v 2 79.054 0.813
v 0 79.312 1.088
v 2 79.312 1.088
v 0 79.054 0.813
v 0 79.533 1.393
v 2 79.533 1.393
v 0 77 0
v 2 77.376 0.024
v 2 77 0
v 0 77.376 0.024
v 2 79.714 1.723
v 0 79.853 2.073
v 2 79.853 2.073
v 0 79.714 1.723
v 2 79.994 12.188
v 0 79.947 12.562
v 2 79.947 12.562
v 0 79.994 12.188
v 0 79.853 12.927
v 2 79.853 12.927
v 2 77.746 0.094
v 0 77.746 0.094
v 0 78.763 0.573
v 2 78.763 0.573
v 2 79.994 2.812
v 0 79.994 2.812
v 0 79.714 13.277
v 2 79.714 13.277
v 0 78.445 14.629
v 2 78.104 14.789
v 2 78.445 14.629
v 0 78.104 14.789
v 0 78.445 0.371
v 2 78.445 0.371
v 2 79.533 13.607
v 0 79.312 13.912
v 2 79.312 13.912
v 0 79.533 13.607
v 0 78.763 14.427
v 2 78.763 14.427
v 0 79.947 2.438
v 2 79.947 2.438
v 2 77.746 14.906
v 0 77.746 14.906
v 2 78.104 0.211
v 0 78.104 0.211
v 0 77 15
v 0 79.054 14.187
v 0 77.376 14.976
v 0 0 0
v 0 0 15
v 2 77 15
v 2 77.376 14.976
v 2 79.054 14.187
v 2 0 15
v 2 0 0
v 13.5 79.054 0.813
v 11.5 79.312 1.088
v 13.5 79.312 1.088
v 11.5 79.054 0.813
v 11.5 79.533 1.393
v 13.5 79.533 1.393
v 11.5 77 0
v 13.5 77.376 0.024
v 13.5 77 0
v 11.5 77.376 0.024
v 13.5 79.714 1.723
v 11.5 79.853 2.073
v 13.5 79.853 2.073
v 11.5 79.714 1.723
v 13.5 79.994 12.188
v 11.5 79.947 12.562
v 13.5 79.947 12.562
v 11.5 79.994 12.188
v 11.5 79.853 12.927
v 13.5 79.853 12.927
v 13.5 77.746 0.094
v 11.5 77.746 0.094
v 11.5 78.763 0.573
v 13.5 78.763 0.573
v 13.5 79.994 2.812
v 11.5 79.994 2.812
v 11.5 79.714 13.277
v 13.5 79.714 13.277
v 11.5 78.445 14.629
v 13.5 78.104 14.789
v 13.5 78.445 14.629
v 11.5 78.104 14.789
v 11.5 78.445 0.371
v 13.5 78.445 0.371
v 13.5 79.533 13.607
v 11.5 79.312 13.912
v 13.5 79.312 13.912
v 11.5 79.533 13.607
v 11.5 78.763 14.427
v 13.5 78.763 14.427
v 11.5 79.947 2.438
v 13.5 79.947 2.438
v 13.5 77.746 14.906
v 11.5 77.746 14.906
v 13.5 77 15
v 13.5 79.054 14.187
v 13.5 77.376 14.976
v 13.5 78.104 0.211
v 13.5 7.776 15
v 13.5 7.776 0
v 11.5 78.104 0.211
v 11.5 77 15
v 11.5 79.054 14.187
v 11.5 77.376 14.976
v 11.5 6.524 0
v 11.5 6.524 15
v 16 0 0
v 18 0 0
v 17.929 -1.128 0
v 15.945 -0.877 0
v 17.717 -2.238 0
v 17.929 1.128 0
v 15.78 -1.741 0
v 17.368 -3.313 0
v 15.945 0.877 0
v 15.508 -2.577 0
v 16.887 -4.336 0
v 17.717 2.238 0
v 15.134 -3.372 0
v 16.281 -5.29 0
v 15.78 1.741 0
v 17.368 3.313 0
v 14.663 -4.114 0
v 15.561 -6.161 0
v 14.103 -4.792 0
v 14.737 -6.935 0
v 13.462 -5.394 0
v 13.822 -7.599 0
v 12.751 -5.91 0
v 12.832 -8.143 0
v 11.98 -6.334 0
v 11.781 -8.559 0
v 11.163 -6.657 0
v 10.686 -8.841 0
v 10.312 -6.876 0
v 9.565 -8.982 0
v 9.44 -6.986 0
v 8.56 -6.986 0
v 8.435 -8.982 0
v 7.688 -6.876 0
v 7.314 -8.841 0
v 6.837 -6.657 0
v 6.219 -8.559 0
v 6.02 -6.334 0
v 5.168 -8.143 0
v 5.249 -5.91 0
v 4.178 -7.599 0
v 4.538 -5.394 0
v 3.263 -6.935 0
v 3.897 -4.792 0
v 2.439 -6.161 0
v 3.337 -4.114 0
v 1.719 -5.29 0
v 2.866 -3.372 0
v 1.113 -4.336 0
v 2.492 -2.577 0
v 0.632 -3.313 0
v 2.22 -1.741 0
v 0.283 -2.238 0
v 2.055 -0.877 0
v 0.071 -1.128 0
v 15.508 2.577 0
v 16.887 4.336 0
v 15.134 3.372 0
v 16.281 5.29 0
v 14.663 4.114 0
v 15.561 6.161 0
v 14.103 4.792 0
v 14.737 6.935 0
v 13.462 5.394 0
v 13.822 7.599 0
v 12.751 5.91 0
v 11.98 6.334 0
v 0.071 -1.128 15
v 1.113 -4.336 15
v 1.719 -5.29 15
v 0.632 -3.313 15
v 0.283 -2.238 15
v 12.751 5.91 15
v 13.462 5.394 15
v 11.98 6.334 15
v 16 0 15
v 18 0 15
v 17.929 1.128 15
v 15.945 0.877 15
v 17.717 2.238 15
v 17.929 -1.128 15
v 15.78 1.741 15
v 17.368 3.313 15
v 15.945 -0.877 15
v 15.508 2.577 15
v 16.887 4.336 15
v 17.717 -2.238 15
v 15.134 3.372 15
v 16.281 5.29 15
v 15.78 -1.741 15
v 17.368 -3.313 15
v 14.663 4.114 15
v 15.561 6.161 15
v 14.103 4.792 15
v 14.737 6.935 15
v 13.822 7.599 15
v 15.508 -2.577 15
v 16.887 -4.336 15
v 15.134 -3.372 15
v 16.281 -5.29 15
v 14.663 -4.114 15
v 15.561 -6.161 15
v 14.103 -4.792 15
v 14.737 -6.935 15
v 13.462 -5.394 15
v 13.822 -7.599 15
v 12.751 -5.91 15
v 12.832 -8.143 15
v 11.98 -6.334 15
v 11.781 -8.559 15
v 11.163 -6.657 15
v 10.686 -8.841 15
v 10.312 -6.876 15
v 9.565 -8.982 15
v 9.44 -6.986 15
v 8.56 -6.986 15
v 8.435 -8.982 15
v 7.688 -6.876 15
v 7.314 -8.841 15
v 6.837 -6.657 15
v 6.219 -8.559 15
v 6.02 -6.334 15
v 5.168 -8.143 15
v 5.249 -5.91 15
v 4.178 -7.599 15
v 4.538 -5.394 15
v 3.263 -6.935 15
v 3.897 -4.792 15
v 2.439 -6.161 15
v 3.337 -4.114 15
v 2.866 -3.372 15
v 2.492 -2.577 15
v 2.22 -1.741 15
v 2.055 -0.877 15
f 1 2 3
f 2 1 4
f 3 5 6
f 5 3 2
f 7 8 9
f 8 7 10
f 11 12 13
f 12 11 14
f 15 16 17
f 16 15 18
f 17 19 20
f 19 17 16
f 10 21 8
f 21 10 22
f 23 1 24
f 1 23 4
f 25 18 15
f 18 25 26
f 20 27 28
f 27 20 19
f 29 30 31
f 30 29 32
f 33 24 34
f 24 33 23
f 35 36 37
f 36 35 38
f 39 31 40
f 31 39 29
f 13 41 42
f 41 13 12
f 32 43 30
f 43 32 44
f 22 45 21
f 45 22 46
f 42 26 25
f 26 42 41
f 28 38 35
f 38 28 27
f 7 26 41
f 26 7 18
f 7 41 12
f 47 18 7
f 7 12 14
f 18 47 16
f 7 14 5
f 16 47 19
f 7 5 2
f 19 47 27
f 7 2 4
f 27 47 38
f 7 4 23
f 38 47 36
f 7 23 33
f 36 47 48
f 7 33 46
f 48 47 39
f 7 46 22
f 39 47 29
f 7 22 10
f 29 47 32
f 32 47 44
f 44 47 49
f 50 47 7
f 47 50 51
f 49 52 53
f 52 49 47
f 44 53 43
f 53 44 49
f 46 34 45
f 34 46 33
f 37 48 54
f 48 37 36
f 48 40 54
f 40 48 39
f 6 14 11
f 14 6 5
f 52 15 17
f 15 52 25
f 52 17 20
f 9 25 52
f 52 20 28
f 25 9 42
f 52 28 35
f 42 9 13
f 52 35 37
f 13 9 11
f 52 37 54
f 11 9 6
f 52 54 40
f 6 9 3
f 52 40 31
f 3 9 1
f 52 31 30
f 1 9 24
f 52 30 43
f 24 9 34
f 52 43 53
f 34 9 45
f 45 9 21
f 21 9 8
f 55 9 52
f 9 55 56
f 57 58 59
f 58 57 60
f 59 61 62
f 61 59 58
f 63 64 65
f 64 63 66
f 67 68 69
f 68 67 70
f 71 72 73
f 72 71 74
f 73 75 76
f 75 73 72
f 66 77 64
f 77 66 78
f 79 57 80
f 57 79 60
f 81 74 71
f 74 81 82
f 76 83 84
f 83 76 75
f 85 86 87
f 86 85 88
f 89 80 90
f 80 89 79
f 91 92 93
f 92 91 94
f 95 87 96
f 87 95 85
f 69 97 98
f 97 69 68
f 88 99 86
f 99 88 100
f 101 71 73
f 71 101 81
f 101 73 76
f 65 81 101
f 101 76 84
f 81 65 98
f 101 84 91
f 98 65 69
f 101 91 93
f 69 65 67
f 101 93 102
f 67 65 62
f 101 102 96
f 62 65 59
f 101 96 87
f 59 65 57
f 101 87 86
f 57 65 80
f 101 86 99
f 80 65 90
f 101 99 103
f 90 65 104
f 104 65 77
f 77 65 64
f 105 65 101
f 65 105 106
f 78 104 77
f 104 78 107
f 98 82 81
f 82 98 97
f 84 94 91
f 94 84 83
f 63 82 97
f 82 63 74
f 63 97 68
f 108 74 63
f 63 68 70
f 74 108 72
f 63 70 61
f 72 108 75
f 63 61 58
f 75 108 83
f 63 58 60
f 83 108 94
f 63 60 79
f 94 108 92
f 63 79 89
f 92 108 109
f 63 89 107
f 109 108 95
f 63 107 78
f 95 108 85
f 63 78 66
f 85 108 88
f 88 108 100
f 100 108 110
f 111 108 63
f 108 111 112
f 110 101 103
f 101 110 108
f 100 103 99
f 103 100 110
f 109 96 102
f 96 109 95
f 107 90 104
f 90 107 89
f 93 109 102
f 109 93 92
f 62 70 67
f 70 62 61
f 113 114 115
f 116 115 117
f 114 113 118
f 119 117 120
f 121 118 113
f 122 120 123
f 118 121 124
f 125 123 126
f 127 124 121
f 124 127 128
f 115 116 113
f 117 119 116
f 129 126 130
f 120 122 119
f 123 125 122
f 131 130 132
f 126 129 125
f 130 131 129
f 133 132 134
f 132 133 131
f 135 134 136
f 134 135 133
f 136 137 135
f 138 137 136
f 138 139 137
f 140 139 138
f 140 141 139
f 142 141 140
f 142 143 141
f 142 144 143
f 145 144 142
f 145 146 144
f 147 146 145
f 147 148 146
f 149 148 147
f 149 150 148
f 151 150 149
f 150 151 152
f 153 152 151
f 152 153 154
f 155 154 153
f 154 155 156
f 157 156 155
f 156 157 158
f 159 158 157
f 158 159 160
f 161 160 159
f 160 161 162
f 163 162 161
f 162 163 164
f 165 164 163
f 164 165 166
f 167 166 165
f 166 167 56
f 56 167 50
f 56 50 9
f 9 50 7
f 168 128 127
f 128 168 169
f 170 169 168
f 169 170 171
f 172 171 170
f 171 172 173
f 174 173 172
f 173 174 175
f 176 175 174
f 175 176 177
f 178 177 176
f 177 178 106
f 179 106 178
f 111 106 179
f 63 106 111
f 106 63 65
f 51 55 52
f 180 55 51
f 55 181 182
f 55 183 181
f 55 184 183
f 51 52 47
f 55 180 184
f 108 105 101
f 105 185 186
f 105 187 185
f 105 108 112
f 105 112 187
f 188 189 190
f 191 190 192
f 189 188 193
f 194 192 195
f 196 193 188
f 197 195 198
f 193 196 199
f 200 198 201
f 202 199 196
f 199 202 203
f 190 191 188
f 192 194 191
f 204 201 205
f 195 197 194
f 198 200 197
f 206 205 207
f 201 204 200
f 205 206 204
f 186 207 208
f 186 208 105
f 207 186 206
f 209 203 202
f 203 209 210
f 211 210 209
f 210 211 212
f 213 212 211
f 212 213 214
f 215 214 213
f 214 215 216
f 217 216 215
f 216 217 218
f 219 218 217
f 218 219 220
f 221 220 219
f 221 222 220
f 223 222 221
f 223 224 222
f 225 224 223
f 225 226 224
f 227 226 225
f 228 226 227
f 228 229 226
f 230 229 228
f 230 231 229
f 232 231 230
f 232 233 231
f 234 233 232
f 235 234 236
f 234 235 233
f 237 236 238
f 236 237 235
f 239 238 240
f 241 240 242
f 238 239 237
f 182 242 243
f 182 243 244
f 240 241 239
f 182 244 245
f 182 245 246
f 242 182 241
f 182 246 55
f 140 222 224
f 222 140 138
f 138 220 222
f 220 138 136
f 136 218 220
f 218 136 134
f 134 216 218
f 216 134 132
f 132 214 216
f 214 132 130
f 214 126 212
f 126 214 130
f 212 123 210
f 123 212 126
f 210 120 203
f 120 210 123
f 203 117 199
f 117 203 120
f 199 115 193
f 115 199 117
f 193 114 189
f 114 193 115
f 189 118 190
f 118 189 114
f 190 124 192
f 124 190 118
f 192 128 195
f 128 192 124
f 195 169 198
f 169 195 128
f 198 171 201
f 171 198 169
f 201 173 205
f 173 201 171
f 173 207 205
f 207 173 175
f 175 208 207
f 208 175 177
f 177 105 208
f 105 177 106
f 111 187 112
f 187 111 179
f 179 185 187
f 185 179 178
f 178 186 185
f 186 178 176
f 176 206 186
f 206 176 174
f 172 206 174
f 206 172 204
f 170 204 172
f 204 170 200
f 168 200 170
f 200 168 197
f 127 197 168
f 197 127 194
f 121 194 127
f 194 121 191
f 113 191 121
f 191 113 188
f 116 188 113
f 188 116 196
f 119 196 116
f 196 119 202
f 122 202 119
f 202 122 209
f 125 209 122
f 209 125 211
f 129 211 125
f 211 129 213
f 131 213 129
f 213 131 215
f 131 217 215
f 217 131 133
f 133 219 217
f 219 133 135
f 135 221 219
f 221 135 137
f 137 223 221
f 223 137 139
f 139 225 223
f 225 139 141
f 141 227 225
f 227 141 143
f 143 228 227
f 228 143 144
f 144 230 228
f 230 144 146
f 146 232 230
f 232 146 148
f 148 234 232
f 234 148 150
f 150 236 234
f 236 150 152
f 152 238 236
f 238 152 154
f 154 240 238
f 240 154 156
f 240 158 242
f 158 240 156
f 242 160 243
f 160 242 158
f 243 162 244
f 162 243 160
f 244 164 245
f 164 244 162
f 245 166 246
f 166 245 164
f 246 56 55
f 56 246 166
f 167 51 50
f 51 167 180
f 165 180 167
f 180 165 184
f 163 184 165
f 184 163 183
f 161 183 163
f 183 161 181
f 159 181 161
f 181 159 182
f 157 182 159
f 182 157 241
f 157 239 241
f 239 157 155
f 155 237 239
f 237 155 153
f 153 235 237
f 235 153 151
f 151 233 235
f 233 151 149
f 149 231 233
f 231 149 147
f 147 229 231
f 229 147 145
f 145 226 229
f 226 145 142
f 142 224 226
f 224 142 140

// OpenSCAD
$fn=50;

/* [Clip-Dims] */
wallThck=2;
clipThck=9.5;
ovDims=[15,18,80]; //height is clipped height
crnrRad=3;

/* [hidden] */
fudge=0.1;
rad=ovDims.y/2-wallThck;

linear_extrude(ovDims.x) clip();

for (ix=[0,1])
  translate([ix*(wallThck+clipThck),ovDims.z-crnrRad,0]) 
    hull() for (iz=[crnrRad,ovDims.x-crnrRad]) translate([0,0,,iz]) 
      rotate([0,90,0]) cylinder(r=crnrRad,h=wallThck);

module clip(){
  
  difference(){
    union(){
      translate([rad+wallThck,0]) circle(rad+wallThck);
      square([wallThck*2+clipThck,ovDims.z-crnrRad]);
    }
    translate([rad+wallThck,0]) circle(rad);
    translate([wallThck,0]) square([clipThck,ovDims.z-crnrRad+fudge]);
  }
}
